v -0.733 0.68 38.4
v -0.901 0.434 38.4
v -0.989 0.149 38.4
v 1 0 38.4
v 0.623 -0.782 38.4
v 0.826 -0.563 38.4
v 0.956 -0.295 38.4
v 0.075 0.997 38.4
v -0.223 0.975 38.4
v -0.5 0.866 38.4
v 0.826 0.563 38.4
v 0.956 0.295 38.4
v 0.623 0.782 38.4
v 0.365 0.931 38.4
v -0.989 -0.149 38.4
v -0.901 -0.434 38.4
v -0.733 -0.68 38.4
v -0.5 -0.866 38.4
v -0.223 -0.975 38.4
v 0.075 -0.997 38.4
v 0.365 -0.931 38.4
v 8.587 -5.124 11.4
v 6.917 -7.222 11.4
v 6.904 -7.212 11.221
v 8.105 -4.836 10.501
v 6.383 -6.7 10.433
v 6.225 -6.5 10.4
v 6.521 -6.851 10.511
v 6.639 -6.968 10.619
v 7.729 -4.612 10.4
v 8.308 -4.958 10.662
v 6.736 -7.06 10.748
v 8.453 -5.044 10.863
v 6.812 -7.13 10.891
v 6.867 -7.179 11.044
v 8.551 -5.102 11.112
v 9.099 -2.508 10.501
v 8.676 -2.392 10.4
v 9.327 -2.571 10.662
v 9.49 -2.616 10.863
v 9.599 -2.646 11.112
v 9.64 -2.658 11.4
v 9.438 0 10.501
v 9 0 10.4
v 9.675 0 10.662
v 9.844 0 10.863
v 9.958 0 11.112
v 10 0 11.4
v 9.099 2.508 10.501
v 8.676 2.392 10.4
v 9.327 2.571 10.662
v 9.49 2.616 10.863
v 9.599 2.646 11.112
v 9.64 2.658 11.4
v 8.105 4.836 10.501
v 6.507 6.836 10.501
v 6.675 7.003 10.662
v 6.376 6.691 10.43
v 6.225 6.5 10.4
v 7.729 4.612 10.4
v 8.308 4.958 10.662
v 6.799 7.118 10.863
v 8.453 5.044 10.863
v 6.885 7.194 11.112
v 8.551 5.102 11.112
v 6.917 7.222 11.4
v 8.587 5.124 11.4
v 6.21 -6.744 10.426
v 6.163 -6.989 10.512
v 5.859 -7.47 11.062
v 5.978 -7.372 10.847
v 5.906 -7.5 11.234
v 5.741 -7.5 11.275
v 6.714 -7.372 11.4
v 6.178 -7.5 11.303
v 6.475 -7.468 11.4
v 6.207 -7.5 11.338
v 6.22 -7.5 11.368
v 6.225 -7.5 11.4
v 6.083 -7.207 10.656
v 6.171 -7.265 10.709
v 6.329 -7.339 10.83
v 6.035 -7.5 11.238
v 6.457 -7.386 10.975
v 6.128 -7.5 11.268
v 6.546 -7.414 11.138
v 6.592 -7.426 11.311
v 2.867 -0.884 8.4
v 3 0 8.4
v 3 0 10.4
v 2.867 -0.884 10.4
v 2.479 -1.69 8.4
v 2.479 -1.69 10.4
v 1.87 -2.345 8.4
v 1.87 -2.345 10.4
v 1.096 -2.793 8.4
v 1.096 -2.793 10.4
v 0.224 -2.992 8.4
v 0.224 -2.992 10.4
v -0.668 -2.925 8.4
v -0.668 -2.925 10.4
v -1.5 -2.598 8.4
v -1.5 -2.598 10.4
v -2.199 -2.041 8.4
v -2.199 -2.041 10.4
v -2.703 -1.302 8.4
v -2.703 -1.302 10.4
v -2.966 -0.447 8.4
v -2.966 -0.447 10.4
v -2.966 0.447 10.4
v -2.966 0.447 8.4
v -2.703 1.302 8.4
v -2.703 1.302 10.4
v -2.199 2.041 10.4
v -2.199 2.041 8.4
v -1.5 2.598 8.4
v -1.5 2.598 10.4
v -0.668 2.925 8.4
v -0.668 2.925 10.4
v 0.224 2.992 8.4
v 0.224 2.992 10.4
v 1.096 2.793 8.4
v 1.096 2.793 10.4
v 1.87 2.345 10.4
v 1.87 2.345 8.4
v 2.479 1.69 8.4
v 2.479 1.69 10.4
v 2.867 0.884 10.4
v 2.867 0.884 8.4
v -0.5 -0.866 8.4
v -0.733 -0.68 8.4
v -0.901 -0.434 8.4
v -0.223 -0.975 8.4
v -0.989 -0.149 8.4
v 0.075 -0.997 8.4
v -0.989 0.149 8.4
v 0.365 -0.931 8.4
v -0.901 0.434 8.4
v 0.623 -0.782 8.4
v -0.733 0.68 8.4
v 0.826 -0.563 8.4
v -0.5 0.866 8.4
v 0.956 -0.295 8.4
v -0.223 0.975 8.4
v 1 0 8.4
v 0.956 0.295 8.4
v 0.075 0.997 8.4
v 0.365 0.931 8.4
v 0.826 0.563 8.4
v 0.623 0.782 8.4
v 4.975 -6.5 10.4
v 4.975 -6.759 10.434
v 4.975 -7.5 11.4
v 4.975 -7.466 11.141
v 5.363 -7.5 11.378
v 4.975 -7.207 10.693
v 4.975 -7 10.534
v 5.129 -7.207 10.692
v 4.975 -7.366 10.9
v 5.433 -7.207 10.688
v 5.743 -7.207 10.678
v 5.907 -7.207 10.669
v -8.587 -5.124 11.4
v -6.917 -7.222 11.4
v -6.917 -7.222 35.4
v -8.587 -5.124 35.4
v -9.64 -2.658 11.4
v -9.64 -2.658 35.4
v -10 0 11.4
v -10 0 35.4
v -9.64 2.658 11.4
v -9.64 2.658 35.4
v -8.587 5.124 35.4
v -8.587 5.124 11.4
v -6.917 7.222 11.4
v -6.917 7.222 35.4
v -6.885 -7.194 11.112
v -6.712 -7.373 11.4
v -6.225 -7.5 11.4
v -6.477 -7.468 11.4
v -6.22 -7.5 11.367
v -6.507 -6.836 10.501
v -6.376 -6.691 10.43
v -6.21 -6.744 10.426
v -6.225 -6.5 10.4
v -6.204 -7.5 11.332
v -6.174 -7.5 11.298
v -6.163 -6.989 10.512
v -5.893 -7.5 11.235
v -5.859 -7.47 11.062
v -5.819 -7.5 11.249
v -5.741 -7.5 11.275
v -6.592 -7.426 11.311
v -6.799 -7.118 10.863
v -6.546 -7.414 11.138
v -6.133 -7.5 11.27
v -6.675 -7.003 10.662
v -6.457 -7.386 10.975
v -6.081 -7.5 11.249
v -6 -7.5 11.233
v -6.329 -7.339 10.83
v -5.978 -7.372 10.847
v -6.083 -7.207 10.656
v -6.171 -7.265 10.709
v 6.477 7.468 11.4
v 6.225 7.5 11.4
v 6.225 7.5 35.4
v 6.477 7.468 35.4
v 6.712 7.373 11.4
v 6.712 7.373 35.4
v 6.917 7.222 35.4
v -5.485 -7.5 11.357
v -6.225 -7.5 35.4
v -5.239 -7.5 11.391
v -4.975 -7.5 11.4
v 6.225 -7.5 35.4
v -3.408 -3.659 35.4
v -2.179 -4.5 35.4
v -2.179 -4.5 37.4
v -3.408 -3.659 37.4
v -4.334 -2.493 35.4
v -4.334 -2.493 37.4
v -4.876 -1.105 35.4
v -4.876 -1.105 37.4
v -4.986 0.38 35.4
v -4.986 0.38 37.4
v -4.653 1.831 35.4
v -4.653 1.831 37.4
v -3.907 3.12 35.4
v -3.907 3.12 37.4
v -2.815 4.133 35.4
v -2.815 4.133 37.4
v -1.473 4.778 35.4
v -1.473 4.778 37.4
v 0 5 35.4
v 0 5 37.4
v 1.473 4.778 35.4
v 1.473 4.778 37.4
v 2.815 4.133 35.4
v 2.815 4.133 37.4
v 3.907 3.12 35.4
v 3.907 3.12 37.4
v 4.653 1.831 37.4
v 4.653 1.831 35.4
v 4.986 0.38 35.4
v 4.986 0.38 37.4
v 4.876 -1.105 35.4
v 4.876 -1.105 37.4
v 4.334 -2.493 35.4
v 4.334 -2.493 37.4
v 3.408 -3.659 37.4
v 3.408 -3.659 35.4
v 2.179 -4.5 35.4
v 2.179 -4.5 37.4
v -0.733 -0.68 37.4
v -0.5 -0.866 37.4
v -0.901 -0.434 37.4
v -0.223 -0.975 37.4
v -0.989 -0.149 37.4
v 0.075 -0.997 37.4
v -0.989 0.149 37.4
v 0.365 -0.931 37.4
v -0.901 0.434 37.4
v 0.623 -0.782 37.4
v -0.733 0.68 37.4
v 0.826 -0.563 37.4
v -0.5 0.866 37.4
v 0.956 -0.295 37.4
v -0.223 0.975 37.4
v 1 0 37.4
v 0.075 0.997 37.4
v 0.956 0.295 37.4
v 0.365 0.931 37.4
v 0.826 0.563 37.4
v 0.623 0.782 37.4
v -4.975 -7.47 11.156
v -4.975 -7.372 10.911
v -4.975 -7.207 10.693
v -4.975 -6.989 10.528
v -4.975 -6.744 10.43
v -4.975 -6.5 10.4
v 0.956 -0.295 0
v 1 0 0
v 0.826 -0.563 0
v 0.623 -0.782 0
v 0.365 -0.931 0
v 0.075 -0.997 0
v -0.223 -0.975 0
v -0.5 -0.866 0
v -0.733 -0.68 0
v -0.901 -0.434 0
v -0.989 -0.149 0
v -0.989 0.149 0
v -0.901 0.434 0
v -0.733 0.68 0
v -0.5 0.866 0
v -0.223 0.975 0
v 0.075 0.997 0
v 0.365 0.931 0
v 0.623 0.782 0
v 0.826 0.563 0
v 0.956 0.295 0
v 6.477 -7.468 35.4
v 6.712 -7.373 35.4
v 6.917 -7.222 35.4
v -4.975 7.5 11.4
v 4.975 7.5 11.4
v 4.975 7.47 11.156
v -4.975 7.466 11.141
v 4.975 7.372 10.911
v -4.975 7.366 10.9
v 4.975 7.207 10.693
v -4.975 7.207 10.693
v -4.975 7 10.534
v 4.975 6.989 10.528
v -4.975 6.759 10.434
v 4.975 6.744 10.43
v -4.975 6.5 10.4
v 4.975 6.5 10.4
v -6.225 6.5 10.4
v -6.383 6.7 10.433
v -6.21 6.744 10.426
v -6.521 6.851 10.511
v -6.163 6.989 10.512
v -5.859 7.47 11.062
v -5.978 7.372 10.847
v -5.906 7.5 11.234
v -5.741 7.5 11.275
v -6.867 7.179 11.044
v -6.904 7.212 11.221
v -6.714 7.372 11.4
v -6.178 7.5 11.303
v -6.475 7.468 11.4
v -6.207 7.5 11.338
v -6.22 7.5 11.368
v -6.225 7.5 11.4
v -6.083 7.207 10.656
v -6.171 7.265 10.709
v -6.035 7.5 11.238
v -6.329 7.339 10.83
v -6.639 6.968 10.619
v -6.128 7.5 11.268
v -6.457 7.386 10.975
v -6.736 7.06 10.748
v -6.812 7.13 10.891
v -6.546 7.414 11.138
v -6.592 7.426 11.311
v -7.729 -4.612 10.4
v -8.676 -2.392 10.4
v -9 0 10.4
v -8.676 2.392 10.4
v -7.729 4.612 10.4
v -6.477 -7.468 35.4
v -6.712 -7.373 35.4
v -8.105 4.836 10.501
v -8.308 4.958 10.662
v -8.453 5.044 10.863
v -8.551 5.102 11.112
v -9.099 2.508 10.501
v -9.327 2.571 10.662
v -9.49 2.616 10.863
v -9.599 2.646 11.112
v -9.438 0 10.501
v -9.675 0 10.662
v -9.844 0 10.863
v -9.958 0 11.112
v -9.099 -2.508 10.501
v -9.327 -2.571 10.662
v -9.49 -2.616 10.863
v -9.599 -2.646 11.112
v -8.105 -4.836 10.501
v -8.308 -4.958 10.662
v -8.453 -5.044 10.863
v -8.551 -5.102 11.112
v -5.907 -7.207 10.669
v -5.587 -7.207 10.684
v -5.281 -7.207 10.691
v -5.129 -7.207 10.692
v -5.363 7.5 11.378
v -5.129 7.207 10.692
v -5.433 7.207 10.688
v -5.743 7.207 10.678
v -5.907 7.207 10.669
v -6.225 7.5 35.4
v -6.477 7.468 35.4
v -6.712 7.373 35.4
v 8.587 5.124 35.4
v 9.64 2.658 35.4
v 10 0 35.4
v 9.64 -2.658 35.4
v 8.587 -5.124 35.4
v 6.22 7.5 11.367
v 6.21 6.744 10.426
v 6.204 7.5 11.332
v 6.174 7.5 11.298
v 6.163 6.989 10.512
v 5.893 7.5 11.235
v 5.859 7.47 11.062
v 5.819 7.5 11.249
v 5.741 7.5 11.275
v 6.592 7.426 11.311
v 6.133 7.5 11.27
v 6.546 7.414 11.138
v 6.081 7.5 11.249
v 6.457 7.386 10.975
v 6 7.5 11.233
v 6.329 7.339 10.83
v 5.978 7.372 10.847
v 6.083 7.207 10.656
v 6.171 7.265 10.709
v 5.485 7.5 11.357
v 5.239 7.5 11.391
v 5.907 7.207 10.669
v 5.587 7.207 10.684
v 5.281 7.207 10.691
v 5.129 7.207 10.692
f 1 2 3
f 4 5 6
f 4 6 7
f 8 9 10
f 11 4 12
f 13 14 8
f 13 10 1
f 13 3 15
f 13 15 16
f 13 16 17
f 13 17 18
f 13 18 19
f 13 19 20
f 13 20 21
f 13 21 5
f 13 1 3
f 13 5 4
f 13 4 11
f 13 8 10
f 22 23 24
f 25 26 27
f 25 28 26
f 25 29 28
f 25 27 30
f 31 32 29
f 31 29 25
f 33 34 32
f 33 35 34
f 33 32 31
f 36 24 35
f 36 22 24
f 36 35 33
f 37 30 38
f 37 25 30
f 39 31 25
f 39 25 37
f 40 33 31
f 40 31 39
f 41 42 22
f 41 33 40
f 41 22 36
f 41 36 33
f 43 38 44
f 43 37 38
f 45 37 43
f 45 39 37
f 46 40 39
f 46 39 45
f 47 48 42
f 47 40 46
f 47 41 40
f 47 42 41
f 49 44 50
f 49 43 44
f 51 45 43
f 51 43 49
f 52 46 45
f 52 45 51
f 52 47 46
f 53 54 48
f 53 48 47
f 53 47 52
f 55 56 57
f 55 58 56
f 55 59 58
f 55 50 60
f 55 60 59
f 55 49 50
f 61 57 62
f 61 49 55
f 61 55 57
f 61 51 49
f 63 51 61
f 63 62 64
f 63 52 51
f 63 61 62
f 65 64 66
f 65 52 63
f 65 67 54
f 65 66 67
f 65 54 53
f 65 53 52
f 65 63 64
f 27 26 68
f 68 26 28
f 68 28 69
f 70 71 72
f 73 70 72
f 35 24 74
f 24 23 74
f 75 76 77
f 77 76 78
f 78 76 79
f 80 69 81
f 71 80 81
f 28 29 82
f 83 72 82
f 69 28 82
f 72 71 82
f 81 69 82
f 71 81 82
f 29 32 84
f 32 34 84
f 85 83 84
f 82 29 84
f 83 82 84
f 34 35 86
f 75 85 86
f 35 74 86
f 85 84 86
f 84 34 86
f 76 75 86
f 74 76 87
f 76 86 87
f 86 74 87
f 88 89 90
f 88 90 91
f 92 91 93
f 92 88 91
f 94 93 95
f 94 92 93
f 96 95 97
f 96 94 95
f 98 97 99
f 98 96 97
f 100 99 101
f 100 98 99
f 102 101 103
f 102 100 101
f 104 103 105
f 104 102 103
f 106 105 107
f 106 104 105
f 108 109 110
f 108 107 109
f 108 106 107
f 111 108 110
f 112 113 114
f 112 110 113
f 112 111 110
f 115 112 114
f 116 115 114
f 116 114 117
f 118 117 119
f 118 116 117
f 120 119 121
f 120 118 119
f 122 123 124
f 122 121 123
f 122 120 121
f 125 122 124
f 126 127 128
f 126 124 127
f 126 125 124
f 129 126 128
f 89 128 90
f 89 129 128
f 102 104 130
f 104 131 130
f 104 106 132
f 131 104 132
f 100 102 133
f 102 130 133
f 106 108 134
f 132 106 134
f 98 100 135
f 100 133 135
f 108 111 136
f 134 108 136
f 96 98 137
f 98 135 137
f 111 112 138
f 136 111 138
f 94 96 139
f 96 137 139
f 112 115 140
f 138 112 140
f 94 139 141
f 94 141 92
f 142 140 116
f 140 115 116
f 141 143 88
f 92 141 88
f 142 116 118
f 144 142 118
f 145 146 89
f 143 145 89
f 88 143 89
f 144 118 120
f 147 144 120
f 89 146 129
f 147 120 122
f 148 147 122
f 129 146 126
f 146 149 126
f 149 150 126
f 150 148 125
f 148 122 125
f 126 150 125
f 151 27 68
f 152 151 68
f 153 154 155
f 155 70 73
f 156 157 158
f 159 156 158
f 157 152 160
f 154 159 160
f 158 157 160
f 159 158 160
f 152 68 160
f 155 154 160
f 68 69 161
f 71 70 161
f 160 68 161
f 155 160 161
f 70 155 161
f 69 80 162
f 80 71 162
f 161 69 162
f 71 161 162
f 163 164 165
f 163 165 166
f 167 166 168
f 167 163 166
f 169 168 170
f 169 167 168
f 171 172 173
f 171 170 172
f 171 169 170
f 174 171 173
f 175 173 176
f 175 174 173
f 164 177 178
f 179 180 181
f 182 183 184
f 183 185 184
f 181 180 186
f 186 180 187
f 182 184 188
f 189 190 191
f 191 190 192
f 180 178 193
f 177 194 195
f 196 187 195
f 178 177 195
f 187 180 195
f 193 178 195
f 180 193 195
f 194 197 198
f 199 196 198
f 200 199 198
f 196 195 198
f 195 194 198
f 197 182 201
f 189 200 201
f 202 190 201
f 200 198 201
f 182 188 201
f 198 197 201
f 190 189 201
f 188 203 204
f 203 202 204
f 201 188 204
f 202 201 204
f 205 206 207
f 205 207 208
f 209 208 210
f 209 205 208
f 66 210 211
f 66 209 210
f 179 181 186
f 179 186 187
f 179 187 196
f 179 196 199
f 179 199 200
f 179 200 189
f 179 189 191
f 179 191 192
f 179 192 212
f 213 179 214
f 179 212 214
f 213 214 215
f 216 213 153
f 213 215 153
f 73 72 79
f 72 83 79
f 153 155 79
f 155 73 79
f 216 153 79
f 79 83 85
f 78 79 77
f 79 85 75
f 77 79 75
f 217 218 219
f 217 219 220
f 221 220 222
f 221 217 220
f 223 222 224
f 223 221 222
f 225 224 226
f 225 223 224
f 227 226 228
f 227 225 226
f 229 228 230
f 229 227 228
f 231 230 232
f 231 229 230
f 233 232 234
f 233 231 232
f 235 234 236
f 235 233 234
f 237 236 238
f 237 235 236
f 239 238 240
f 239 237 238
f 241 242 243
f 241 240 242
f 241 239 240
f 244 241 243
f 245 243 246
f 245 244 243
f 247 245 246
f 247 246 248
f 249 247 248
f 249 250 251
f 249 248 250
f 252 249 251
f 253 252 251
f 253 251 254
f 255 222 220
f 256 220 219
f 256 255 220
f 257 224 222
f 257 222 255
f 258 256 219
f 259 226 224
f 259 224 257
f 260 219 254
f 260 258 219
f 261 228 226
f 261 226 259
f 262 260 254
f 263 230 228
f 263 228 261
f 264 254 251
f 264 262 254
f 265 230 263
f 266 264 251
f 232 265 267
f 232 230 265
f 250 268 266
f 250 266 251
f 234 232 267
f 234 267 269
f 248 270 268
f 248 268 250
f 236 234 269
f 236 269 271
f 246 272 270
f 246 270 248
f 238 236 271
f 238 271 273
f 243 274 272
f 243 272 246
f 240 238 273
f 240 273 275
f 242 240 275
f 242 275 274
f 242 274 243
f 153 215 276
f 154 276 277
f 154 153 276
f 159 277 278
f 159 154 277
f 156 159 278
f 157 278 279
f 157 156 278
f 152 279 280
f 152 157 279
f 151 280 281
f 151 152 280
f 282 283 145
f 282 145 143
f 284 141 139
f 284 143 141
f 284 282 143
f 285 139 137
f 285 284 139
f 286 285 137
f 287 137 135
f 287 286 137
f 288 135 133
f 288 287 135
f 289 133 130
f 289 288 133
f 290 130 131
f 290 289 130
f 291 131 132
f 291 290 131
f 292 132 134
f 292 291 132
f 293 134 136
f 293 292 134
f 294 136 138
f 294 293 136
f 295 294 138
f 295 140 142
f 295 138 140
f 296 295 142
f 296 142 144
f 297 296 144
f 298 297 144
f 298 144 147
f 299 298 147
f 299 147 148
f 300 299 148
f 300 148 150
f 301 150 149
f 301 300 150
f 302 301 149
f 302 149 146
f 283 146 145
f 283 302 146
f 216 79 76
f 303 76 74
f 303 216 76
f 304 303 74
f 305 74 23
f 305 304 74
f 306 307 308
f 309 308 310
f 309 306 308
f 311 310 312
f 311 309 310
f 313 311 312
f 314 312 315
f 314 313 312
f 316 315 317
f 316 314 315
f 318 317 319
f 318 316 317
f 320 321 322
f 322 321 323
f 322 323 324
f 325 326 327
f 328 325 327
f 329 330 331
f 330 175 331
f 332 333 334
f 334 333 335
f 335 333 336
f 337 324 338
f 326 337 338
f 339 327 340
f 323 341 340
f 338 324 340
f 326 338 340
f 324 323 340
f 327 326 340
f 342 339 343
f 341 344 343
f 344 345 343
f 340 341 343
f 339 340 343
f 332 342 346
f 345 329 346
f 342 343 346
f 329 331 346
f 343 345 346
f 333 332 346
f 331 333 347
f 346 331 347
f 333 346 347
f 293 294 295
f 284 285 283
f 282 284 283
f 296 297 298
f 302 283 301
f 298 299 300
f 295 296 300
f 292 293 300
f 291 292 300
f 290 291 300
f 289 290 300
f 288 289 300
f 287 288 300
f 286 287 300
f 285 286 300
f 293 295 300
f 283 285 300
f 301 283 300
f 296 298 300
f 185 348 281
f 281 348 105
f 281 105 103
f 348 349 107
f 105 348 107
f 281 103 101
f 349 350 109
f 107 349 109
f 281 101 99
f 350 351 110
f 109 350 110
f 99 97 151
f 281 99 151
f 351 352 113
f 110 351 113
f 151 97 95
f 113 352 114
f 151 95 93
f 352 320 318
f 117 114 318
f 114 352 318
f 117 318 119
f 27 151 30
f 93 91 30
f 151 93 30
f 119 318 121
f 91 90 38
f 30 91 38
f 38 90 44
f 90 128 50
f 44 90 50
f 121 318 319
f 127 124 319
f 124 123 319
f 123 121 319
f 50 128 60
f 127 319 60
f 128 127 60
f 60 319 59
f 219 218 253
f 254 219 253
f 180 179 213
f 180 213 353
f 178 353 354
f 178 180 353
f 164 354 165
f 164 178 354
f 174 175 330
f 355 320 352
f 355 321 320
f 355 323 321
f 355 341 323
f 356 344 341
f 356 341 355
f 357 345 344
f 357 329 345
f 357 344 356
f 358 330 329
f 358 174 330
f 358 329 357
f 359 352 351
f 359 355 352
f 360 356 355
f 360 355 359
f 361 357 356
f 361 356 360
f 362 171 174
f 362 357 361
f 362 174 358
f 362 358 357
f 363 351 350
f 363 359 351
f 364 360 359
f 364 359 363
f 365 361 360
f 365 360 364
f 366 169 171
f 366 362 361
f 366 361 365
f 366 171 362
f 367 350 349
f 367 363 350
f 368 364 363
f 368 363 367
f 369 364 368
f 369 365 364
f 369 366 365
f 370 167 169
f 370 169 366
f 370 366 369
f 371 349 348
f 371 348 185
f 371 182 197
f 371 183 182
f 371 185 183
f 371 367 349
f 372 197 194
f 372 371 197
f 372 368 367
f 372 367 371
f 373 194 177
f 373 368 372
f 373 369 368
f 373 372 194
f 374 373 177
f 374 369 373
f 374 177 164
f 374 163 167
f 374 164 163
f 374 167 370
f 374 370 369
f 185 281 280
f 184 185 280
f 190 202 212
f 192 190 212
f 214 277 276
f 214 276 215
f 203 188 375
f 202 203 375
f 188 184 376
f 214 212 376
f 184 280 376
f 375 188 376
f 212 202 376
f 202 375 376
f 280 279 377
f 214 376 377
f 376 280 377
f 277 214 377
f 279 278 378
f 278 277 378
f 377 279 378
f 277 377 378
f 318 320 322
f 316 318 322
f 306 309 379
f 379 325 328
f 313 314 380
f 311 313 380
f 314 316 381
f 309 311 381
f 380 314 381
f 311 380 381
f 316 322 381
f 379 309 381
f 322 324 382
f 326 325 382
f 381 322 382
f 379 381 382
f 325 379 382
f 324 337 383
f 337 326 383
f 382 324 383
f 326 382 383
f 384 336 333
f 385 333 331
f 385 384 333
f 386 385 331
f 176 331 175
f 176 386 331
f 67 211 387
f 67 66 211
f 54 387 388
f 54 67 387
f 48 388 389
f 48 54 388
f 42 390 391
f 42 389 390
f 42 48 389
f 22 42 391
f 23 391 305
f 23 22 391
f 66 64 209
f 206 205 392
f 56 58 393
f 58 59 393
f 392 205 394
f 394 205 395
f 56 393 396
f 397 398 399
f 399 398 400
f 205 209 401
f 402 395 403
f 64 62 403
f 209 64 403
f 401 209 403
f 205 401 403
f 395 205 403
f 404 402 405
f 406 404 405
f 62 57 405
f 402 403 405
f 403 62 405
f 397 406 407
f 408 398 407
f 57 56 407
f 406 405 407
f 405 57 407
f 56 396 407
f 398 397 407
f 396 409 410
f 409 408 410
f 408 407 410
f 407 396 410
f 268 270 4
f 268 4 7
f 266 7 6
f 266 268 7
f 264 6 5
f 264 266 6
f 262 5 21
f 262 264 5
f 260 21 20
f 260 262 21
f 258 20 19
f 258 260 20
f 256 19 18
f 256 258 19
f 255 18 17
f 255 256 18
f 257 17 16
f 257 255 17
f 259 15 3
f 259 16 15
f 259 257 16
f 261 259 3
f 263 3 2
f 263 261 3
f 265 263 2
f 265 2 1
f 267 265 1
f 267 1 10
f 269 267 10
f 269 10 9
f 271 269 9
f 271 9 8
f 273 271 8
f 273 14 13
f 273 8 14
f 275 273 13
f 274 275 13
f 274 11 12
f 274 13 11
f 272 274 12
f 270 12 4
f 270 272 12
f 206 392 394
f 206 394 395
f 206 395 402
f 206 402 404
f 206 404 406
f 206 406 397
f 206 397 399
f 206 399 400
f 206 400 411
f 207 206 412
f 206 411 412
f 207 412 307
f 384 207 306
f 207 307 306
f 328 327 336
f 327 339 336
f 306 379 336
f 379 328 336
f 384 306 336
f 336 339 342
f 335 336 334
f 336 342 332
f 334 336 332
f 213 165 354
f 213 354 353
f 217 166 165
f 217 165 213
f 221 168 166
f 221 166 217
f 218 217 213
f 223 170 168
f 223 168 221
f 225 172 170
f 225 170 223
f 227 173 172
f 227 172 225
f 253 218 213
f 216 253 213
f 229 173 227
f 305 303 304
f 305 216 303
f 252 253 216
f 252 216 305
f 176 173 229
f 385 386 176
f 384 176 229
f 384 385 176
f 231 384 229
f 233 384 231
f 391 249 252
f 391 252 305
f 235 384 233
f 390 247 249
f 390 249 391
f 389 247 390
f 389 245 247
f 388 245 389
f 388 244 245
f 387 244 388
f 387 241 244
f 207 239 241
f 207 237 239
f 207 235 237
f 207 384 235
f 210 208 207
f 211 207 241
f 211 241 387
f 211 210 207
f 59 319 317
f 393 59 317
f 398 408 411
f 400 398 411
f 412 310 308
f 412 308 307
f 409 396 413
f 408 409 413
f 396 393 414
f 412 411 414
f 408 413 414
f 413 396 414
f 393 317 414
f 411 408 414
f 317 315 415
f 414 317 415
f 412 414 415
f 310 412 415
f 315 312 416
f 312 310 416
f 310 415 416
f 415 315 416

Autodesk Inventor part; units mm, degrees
ref_plane "YZ Plane" through (0, 0, 0) normal (1, 0, 0) x (0, 1, 0)
ref_plane "XZ Plane" through (0, 0, 0) normal (0, 1, 0) x (-1, 0, 0)
ref_plane "XY Plane" through (0, 0, 0) normal (0, 0, 1) x (1, 0, 0)
sketch "Sketch1" plane through (0, 0, 0) normal (0, 0, 1) x (1, 0, 0)
  circle A0 centre (0, 0) radius 1
  dimension "d0" = 2
extrude "Extrusion1" add sketch "Sketch1" along normal blind 8.4
sketch "Sketch2" plane through (0, 0, 8.4) normal (0, 0, 1) x (1, 0, 0)
  circle A0 centre (0, 0) radius 3
  dimension "d3" = 6
extrude "Extrusion2" add sketch "Sketch2" along normal blind 2
sketch "Sketch3" plane through (0, 0, 10.4) normal (0, 0, 1) x (1, 0, 0)
  line L0 (-6.6144, -7.5) -> (6.6144, -7.5)
  line L1 (6.6144, 7.5) -> (-6.6144, 7.5)
  line L2 (-10, -7.5) -> (10, 7.5) construction
  line L3 (10, -7.5) -> (-10, 7.5) construction
  arc A0 (-6.6144, 7.5) -> (-6.6144, -7.5) centre (0, 0) ccw
  arc A1 (6.6144, -7.5) -> (6.6144, 7.5) centre (0, 0) ccw
extrude "Extrusion3" add sketch "Sketch3" along normal blind 25
sketch "Sketch4" plane through (0, 0, 35.4) normal (0, 0, 1) x (1, 0, 0)
  arc A0 (2.1794, -4.5) -> (-2.1794, -4.5) centre (0, 0) ccw
  line L0 (0, -4.5) -> (2.1794, -4.5)
  line L1 (0, -4.5) -> (-2.1794, -4.5)
  dimension "d10" = 10
extrude "Extrusion4" add sketch "Sketch4" along normal blind 2
sketch "Sketch5" plane through (0, 0, 37.4) normal (0, 0, 1) x (1, 0, 0)
  circle A0 centre (0, 0) radius 1
  dimension "d14" = 2
extrude "Extrusion5" add sketch "Sketch5" along normal blind 1
fillet "Fillet7" radius 1 1 edges at (10, 0, 10.4)
fillet "Fillet8" radius 1 1 edges at (-10, 0, 10.4)
fillet "Fillet9" radius 1 5 edges at (0, -7.5, 10.4) (-6.0606, -7.5, 10.6339) (-6.6144, -7.5, 23.4) (6.0606, -7.5, 10.6339) (6.6144, -7.5, 23.4)
fillet "Fillet10" radius 1 5 edges at (0, 7.5, 10.4) (6.0606, 7.5, 10.6339) (6.6144, 7.5, 23.4) (-6.0606, 7.5, 10.6339) (-6.6144, 7.5, 23.4)
properties part number "motor" material "Aluminum 6061"
